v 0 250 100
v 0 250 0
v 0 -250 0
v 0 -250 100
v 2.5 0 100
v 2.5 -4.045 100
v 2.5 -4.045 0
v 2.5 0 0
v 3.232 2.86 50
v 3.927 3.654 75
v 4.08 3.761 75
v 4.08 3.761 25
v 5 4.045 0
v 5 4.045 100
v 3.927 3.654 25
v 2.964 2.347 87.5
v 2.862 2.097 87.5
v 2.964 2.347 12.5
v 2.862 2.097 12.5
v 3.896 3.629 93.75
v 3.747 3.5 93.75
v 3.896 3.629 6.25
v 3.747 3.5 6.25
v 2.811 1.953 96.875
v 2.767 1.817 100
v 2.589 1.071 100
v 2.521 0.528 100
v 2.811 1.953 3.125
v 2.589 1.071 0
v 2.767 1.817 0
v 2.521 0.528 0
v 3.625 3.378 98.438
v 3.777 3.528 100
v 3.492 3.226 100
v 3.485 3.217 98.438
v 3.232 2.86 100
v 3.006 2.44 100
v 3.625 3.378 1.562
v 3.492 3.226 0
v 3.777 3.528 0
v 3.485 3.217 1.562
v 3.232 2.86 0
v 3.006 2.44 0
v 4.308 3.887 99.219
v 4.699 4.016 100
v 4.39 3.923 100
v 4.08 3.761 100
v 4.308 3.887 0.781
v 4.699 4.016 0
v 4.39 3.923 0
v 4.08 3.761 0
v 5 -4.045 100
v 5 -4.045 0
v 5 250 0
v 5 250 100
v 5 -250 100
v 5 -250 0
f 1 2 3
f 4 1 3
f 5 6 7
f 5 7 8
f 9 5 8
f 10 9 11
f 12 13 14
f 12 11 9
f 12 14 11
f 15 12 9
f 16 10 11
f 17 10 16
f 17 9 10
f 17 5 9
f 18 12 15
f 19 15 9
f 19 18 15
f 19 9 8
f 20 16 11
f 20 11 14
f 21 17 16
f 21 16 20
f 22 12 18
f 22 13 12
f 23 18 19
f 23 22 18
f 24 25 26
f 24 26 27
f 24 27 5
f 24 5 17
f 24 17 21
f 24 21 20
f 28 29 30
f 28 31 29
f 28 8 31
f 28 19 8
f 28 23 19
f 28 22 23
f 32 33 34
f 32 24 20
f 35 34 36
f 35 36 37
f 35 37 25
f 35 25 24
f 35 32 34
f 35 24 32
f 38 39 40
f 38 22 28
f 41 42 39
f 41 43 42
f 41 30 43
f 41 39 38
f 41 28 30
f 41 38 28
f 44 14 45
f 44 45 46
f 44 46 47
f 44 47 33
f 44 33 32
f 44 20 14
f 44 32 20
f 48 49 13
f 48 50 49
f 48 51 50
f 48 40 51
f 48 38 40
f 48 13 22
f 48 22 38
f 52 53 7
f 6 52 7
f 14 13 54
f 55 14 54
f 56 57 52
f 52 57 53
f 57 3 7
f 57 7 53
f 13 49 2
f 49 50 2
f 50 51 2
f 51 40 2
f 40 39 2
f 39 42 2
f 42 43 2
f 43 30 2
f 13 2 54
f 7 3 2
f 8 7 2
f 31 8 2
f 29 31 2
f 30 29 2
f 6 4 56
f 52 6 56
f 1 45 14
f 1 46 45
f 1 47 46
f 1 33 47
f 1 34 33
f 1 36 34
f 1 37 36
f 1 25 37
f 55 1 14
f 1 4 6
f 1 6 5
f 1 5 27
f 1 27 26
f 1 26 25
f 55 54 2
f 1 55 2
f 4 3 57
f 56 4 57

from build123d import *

# Parameters (mm, degrees)
F2_DEPTH = 100


with BuildPart() as f2:
    # F1 (on Top) → F2 (new body)
    with BuildSketch(Plane.XY):
        with BuildLine():
            Line((5, 4.045), (5, 250))
            Line((5, 250), (0, 250))
            Line((0, 250), (0, -250))
            Line((0, -250), (5, -250))
            Line((5, -250), (5, -4.045))
            Line((5, -4.045), (2.5, -4.045))
            Line((2.5, -4.045), (2.5, 0))
            add(Edge.make_bspline(
                [(5, 4.045), (2.5, 4.045), (2.5, 0)],
                knots=[0, 0, 0, 1.5707963268, 1.5707963268, 1.5707963268], degree=2, weights=[1, 0.7071067812, 1]))
        make_face()
    extrude(amount=F2_DEPTH)


solid = f2.part
